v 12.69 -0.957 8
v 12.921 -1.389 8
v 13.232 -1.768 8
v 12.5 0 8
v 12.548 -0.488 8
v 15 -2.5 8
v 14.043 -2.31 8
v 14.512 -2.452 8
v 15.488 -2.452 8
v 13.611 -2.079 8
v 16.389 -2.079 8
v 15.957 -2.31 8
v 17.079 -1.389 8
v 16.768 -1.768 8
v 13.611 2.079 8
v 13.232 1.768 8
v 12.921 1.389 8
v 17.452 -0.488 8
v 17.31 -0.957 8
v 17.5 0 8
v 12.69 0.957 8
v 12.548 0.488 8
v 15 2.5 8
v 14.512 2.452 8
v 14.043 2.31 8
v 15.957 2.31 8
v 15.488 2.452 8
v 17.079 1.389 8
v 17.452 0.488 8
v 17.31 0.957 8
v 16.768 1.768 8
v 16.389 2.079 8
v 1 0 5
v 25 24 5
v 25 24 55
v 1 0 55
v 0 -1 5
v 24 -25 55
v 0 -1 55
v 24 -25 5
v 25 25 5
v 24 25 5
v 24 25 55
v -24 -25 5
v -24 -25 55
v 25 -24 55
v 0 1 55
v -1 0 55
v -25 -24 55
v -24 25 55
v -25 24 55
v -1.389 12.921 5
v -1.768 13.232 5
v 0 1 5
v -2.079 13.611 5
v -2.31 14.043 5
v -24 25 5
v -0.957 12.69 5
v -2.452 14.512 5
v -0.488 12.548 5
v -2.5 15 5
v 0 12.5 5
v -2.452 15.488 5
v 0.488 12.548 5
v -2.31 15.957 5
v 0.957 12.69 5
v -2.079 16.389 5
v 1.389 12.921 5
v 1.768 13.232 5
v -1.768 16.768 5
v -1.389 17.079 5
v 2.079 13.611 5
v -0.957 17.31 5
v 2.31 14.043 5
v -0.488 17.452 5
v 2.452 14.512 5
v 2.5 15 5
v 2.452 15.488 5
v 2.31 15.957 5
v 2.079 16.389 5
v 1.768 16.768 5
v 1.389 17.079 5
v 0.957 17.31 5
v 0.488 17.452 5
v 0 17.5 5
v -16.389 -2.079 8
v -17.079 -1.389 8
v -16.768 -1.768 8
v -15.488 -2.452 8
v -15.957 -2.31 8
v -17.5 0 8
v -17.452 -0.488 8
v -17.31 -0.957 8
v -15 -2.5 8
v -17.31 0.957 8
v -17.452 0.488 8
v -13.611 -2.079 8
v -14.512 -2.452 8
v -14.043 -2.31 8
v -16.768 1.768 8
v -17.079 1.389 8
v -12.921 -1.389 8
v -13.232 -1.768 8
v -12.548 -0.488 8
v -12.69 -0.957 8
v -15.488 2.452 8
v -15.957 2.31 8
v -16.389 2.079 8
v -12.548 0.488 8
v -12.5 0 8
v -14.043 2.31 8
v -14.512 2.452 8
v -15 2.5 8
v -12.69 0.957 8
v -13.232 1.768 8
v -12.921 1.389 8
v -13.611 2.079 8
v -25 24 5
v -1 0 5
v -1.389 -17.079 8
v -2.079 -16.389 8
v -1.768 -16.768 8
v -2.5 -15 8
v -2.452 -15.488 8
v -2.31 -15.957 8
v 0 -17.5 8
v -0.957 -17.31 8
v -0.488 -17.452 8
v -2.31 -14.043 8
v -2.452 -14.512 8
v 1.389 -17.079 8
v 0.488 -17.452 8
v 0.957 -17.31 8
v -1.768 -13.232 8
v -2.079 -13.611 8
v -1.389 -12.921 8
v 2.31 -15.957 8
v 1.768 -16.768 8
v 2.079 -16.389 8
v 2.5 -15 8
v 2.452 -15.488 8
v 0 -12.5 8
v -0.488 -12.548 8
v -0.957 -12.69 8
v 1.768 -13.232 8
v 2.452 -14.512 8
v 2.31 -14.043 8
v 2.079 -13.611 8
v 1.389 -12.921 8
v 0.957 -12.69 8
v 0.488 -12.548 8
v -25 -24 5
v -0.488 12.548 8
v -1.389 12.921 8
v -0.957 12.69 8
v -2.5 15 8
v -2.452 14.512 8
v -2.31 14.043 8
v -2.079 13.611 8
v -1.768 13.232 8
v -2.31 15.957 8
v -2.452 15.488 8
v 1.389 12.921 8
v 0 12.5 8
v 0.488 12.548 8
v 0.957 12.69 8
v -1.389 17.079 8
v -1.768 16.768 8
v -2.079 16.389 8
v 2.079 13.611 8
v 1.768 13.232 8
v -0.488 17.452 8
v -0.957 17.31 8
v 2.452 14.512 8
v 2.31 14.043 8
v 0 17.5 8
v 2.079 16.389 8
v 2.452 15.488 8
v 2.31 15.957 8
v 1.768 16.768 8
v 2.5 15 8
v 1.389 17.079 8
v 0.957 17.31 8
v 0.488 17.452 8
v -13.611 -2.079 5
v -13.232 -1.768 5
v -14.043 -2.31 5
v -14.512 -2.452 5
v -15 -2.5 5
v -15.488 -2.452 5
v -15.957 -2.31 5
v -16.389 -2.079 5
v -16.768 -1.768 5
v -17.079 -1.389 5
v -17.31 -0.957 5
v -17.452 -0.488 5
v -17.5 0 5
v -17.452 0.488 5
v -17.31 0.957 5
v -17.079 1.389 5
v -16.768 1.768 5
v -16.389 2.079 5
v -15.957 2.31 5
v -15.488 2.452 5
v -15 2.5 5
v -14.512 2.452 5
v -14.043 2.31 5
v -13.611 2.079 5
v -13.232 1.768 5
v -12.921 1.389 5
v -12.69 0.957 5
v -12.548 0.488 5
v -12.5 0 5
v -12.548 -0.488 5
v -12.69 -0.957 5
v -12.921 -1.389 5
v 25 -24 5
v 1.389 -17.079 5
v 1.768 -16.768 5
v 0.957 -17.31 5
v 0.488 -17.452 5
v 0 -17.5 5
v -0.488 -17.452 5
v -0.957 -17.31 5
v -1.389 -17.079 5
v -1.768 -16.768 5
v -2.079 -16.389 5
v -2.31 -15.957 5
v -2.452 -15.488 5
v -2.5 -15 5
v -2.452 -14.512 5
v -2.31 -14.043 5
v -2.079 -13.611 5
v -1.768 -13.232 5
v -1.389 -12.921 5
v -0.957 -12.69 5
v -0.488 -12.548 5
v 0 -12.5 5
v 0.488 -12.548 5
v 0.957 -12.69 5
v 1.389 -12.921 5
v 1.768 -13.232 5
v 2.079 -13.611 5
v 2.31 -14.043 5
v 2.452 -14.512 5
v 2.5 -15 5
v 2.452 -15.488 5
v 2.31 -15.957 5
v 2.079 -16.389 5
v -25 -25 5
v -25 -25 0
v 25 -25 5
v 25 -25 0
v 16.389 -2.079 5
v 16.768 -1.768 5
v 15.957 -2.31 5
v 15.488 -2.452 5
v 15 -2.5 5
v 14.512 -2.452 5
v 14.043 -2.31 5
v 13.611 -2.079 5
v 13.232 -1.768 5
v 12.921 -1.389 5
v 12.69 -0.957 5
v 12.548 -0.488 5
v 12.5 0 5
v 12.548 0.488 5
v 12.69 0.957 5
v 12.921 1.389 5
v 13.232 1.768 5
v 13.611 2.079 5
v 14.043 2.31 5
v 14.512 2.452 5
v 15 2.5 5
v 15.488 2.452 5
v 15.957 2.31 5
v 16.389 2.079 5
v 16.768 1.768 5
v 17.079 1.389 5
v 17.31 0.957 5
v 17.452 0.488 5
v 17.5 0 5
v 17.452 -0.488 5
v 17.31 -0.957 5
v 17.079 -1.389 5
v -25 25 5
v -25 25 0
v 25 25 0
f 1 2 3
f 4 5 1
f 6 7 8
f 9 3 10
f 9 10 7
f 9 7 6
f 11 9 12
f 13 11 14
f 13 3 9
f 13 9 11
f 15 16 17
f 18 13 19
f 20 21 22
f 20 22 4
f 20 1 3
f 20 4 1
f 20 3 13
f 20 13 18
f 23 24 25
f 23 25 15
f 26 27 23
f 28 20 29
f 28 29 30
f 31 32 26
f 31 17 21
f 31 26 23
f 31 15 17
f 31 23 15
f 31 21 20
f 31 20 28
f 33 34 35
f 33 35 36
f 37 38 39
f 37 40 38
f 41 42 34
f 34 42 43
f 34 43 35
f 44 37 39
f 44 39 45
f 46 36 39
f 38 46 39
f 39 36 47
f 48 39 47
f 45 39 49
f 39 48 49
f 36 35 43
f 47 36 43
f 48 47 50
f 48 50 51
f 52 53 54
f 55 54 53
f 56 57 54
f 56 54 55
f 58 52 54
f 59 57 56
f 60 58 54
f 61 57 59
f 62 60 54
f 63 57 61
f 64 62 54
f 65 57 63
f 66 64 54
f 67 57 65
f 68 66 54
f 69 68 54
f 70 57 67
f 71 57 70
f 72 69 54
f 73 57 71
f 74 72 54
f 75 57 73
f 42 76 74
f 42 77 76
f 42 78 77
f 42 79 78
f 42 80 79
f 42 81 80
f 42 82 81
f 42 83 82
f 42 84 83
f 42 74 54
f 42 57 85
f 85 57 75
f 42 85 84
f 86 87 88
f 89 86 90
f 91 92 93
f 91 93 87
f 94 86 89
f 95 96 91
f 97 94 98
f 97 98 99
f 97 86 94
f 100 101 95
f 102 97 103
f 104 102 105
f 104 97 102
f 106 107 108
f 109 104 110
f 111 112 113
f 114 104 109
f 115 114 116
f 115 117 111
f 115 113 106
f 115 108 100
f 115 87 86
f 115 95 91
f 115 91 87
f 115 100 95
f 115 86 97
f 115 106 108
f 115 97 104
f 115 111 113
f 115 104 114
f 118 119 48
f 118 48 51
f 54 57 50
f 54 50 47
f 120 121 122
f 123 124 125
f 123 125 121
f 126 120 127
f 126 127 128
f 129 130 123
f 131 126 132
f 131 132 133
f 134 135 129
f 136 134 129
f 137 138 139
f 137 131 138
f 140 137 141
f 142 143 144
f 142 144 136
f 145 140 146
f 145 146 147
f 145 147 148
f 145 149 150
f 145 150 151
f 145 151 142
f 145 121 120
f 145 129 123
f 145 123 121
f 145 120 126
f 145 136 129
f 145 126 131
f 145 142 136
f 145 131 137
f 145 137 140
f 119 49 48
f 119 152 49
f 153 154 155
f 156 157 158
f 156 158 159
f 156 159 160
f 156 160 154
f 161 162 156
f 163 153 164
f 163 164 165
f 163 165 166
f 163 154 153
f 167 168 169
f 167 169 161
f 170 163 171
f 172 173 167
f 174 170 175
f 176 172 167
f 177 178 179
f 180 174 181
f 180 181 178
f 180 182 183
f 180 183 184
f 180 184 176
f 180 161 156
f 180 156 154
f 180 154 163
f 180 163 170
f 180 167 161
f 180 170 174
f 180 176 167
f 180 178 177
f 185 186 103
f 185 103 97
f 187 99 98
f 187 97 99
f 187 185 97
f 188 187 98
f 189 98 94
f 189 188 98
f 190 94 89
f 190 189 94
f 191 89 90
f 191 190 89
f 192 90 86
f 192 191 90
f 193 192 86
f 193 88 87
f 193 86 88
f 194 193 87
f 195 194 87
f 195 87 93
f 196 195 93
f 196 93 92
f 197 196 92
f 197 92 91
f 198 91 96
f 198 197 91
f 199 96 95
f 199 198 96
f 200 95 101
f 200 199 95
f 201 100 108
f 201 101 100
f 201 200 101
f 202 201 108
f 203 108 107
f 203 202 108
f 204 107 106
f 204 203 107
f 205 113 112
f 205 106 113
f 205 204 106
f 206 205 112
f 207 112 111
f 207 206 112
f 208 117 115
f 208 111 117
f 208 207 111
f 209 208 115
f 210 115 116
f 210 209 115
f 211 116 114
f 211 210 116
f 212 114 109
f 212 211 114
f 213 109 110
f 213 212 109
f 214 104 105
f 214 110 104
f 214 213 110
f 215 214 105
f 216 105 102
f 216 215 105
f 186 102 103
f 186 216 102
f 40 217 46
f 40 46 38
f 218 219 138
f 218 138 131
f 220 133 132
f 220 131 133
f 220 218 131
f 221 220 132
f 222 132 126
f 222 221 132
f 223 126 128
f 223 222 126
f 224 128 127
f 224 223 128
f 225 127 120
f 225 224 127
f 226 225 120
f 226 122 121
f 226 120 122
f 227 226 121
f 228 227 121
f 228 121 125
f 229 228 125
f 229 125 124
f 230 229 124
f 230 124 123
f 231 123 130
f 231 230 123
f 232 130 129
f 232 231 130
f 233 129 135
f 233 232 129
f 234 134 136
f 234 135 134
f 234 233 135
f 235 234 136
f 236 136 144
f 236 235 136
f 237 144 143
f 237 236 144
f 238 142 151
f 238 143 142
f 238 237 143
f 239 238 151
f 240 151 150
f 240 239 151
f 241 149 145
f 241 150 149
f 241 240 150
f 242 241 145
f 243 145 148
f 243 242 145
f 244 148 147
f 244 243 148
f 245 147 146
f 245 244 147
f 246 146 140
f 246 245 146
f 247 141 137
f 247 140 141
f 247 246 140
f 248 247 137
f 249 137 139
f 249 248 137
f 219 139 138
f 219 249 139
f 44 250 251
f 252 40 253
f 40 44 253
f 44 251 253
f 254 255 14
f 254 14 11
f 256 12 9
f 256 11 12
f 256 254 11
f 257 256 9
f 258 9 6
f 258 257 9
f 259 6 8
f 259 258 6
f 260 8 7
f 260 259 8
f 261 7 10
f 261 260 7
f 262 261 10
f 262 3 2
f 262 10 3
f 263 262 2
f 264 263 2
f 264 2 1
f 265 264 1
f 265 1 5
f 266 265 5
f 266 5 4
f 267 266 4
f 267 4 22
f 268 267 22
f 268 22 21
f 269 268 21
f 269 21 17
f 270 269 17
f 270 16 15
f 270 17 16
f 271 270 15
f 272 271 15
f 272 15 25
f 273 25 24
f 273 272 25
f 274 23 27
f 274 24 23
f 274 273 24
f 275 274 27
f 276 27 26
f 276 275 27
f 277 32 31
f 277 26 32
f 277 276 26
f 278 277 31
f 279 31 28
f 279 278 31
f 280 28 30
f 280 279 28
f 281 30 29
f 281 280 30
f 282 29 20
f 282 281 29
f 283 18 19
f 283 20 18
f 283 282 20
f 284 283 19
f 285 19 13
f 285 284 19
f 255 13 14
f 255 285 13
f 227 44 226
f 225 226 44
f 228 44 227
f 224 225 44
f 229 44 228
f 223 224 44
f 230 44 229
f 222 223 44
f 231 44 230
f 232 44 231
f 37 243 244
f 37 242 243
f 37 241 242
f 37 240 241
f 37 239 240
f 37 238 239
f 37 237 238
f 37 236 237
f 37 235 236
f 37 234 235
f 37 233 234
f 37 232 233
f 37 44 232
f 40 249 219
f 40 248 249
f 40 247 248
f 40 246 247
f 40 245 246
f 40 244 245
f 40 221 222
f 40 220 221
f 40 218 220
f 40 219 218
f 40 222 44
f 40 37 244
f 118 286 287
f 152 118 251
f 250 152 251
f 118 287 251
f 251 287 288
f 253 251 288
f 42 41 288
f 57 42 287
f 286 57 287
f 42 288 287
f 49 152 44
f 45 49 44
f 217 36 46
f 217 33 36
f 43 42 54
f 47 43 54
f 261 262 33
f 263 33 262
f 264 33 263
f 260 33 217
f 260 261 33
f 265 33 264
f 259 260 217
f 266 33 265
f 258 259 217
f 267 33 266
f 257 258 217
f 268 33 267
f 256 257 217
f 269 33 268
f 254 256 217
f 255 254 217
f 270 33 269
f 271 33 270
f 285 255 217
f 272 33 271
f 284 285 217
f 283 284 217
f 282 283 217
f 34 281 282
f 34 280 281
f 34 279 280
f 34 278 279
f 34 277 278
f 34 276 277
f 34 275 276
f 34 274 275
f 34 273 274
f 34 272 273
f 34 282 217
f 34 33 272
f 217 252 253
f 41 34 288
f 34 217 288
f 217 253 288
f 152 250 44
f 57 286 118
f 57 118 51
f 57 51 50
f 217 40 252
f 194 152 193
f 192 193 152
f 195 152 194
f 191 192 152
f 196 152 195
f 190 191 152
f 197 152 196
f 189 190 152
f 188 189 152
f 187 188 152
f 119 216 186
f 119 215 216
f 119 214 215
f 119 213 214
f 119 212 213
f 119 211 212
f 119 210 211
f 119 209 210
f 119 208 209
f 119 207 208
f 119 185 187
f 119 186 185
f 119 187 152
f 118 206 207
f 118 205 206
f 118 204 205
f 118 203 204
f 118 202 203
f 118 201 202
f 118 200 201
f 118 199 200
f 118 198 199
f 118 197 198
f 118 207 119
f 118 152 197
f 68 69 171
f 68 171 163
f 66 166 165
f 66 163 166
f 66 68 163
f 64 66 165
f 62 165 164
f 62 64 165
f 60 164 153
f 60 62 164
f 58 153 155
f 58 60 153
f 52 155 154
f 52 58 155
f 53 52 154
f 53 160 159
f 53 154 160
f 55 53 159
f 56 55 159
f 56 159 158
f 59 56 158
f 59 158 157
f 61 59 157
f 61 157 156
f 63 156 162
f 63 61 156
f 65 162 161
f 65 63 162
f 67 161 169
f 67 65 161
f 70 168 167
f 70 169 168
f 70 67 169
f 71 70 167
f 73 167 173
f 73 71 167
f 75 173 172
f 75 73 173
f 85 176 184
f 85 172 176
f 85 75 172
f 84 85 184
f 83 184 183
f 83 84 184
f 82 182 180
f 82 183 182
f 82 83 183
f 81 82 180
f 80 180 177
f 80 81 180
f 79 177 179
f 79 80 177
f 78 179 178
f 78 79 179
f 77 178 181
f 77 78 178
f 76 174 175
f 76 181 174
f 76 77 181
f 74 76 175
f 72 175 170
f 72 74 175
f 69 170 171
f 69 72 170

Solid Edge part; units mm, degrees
sketch "Sketch1" plane through (0, 0, 0) normal (0, 0, 1) x (1, 0, 0)
  line L0 (-25, -25) -> (25, -25)
  line L1 (25, -25) -> (25, 25)
  line L2 (25, 25) -> (-25, 25)
  line L3 (-25, 25) -> (-25, -25)
extrude "Protrusion1" add sketch "Sketch1" along normal blind 5
sketch "Sketch2" plane through (0, 0, 5) normal (0, 0, 1) x (0, -1, 0)
  line L0 (25, 24) -> (1, 0)
  line L1 (1, 0) -> (25, -24)
  line L2 (24, -25) -> (25, -24)
  line L3 (24, -25) -> (0, -1)
  line L4 (0, -1) -> (-24, -25)
  line L5 (-24, -25) -> (-25, -24)
  line L6 (-25, -24) -> (-1, 0)
  line L7 (-25, 24) -> (-1, 0)
  line L8 (-25, 24) -> (-24, 25)
  line L9 (-24, 25) -> (0, 1)
  line L10 (0, 1) -> (24, 25)
  line L11 (24, 25) -> (25, 24)
extrude "Kihúzás_2" add sketch "Sketch2" along normal blind 50
sketch "Sketch3" plane through (0, 13, 5) normal (0, 0, 1) x (0.7071, -0.7071, 0)
  circle A0 centre (-1.4142, 1.4142) radius 2.5
  circle A1 centre (19.799, 1.4142) radius 2.5
  circle A2 centre (19.799, -19.799) radius 2.5
  circle A3 centre (-1.4142, -19.799) radius 2.5
extrude "Kihúzás_3" add sketch "Sketch3" along normal blind 3
